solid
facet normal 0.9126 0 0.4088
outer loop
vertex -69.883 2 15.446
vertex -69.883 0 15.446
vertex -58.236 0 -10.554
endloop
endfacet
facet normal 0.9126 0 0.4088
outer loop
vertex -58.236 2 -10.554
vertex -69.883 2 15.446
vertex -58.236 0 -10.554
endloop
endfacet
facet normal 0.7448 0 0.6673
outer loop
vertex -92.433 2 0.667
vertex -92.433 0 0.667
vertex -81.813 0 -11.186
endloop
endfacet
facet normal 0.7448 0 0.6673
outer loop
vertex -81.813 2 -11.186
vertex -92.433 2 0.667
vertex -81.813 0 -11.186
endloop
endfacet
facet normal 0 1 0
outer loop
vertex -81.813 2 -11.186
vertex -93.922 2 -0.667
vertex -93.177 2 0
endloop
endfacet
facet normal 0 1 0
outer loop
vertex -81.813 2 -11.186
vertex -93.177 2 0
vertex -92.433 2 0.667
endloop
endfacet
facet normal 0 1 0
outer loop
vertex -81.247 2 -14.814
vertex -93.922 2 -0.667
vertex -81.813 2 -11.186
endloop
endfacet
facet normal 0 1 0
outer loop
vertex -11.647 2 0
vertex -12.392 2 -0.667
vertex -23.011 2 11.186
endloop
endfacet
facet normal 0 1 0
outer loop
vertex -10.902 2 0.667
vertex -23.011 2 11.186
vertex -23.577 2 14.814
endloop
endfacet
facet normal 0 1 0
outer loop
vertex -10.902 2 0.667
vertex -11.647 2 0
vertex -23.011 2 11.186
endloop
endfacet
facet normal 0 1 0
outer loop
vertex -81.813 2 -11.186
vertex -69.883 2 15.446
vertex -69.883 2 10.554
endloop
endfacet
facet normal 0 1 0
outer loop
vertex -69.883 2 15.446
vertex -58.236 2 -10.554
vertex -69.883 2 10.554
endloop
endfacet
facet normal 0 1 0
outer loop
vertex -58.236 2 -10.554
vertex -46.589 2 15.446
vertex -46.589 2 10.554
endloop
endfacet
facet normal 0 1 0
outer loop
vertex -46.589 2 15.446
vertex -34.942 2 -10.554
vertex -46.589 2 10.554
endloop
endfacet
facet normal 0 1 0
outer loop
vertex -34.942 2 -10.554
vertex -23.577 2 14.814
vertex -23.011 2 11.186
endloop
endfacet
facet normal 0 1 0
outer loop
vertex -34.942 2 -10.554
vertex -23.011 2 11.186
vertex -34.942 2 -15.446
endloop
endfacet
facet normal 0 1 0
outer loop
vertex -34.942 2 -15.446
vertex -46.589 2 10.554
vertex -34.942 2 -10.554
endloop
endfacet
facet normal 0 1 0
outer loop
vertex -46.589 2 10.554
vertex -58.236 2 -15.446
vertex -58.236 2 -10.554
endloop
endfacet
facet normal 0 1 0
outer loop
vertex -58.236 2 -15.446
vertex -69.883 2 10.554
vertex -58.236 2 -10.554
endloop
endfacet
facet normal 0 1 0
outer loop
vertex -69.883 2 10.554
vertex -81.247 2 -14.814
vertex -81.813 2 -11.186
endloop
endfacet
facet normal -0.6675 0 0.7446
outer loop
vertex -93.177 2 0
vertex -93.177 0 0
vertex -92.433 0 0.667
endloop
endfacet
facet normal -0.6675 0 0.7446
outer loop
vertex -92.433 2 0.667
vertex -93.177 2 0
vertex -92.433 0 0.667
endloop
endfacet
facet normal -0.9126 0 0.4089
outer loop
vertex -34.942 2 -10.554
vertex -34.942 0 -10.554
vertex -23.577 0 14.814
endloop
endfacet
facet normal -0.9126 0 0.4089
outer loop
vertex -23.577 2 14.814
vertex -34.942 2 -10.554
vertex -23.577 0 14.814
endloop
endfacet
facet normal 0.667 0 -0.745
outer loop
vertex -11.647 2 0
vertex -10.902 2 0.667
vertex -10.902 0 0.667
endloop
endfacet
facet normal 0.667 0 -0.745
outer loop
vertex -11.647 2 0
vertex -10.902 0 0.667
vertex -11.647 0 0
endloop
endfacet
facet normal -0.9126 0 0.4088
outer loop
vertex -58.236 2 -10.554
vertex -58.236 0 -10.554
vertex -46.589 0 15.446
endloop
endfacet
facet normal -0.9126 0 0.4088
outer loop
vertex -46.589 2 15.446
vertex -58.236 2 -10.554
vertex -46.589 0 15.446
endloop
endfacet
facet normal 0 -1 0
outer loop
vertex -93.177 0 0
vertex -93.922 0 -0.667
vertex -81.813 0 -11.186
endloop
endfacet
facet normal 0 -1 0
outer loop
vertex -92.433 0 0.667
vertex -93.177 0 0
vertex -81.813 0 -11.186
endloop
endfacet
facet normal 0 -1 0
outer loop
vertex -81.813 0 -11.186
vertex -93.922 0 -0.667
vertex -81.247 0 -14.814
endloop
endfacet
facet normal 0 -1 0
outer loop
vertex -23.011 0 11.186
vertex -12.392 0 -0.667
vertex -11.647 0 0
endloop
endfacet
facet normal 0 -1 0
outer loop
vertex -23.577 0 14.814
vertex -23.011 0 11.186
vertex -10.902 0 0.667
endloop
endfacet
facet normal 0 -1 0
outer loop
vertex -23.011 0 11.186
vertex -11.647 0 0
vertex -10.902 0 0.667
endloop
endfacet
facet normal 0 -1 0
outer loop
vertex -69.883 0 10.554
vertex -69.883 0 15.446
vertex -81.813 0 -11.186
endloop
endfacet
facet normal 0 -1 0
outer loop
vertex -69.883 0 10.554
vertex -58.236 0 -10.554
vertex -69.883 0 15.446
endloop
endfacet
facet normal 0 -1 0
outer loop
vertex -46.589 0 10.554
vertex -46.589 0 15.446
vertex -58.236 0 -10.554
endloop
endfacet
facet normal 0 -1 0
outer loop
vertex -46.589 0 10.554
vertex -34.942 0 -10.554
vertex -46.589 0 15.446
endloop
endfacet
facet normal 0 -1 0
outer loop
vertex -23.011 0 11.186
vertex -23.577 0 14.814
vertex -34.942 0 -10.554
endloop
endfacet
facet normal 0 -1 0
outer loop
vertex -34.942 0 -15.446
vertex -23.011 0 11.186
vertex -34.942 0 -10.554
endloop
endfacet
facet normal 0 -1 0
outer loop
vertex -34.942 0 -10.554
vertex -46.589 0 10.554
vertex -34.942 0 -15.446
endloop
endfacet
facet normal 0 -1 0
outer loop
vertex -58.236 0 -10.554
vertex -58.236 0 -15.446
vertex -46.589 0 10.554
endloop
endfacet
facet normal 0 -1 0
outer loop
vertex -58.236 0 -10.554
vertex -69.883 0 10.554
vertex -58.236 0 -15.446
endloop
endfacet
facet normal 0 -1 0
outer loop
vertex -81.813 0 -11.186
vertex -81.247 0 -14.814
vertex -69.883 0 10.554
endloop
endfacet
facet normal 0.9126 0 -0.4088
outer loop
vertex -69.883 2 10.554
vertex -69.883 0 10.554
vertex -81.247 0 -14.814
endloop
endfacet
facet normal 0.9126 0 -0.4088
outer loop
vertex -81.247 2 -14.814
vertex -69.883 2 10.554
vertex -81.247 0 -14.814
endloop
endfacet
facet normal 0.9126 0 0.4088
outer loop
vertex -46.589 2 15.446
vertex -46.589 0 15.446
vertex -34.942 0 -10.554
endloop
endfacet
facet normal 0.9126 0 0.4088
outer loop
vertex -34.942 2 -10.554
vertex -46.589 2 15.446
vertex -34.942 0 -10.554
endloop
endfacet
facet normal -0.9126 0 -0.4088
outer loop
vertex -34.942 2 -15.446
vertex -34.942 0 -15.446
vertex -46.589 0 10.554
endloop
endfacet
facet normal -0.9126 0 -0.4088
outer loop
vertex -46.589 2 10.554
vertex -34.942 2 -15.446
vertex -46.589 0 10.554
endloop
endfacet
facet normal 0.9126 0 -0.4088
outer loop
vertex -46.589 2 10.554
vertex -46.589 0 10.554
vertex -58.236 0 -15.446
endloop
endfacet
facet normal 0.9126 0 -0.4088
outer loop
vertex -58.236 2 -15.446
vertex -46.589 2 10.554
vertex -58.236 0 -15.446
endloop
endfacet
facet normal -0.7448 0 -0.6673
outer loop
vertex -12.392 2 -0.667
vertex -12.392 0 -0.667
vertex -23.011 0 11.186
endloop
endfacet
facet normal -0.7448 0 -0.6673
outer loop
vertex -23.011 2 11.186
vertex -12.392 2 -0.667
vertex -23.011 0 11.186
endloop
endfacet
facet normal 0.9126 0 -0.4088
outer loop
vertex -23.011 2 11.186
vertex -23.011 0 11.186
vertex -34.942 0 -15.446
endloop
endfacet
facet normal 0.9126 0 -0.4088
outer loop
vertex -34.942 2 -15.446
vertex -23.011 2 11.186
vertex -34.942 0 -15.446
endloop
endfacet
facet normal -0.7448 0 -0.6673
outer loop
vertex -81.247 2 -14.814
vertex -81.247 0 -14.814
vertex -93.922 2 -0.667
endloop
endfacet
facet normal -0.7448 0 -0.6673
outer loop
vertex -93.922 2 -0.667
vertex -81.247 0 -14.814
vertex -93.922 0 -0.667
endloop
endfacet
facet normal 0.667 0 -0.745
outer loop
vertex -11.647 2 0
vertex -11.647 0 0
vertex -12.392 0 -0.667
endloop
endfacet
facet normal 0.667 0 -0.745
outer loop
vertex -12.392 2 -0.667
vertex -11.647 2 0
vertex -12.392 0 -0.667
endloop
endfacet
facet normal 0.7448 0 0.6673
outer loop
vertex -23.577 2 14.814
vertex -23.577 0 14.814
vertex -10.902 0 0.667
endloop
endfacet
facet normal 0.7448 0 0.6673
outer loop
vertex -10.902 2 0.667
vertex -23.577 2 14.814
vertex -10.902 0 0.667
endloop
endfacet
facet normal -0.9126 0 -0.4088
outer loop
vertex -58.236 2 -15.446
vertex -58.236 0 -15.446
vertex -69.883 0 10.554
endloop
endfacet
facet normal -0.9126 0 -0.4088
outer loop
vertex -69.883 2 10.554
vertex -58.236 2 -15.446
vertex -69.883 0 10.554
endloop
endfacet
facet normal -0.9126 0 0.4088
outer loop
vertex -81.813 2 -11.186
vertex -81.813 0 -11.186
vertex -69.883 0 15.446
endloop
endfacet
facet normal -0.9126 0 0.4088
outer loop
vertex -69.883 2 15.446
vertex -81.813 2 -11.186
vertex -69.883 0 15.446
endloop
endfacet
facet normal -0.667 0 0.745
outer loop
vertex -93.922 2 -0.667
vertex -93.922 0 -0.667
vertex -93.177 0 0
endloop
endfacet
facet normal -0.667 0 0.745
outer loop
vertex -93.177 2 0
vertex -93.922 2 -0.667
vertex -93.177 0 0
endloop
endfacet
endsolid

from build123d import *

# Parameters (mm, degrees)
BOSS_EXTRUDE1_DEPTH = 2


with BuildPart() as part:
    # Sketch1 → Boss-Extrude1 (new body)
    with BuildSketch(Plane(origin=(0, 0, 0), x_dir=(1, 0, 0), z_dir=(0, 1, 0))):
        Polygon((-93.922283941, 0.667291311), (-93.177487119, 0), (-81.530301229, 13), (-69.883115339, -13), (-58.235929449, 13), (-46.588743559, -13), (-34.941557669, 13), (-23.29437178, -13), (-11.64718589, 0), (-12.391982712, 0.667291311), (-23.011418731, -11.185586247), (-34.941557669, 15.446049526), (-46.588743559, -10.553950474), (-58.235929449, 15.446049526), (-69.883115339, -10.553950474), (-81.24734818, 14.814413753), align=None)
        Polygon((-81.530301229, 13), (-93.177487119, 0), (-92.432690296, -0.667291311), (-81.813254277, 11.185586247), (-69.883115339, -15.446049526), (-58.235929449, 10.553950474), (-46.588743559, -15.446049526), (-34.941557669, 10.553950474), (-23.577324828, -14.814413753), (-10.902389067, -0.667291311), (-11.64718589, 0), (-23.29437178, -13), (-34.941557669, 13), (-46.588743559, -13), (-58.235929449, 13), (-69.883115339, -13), align=None)
    extrude(amount=BOSS_EXTRUDE1_DEPTH)


solid = part.part
